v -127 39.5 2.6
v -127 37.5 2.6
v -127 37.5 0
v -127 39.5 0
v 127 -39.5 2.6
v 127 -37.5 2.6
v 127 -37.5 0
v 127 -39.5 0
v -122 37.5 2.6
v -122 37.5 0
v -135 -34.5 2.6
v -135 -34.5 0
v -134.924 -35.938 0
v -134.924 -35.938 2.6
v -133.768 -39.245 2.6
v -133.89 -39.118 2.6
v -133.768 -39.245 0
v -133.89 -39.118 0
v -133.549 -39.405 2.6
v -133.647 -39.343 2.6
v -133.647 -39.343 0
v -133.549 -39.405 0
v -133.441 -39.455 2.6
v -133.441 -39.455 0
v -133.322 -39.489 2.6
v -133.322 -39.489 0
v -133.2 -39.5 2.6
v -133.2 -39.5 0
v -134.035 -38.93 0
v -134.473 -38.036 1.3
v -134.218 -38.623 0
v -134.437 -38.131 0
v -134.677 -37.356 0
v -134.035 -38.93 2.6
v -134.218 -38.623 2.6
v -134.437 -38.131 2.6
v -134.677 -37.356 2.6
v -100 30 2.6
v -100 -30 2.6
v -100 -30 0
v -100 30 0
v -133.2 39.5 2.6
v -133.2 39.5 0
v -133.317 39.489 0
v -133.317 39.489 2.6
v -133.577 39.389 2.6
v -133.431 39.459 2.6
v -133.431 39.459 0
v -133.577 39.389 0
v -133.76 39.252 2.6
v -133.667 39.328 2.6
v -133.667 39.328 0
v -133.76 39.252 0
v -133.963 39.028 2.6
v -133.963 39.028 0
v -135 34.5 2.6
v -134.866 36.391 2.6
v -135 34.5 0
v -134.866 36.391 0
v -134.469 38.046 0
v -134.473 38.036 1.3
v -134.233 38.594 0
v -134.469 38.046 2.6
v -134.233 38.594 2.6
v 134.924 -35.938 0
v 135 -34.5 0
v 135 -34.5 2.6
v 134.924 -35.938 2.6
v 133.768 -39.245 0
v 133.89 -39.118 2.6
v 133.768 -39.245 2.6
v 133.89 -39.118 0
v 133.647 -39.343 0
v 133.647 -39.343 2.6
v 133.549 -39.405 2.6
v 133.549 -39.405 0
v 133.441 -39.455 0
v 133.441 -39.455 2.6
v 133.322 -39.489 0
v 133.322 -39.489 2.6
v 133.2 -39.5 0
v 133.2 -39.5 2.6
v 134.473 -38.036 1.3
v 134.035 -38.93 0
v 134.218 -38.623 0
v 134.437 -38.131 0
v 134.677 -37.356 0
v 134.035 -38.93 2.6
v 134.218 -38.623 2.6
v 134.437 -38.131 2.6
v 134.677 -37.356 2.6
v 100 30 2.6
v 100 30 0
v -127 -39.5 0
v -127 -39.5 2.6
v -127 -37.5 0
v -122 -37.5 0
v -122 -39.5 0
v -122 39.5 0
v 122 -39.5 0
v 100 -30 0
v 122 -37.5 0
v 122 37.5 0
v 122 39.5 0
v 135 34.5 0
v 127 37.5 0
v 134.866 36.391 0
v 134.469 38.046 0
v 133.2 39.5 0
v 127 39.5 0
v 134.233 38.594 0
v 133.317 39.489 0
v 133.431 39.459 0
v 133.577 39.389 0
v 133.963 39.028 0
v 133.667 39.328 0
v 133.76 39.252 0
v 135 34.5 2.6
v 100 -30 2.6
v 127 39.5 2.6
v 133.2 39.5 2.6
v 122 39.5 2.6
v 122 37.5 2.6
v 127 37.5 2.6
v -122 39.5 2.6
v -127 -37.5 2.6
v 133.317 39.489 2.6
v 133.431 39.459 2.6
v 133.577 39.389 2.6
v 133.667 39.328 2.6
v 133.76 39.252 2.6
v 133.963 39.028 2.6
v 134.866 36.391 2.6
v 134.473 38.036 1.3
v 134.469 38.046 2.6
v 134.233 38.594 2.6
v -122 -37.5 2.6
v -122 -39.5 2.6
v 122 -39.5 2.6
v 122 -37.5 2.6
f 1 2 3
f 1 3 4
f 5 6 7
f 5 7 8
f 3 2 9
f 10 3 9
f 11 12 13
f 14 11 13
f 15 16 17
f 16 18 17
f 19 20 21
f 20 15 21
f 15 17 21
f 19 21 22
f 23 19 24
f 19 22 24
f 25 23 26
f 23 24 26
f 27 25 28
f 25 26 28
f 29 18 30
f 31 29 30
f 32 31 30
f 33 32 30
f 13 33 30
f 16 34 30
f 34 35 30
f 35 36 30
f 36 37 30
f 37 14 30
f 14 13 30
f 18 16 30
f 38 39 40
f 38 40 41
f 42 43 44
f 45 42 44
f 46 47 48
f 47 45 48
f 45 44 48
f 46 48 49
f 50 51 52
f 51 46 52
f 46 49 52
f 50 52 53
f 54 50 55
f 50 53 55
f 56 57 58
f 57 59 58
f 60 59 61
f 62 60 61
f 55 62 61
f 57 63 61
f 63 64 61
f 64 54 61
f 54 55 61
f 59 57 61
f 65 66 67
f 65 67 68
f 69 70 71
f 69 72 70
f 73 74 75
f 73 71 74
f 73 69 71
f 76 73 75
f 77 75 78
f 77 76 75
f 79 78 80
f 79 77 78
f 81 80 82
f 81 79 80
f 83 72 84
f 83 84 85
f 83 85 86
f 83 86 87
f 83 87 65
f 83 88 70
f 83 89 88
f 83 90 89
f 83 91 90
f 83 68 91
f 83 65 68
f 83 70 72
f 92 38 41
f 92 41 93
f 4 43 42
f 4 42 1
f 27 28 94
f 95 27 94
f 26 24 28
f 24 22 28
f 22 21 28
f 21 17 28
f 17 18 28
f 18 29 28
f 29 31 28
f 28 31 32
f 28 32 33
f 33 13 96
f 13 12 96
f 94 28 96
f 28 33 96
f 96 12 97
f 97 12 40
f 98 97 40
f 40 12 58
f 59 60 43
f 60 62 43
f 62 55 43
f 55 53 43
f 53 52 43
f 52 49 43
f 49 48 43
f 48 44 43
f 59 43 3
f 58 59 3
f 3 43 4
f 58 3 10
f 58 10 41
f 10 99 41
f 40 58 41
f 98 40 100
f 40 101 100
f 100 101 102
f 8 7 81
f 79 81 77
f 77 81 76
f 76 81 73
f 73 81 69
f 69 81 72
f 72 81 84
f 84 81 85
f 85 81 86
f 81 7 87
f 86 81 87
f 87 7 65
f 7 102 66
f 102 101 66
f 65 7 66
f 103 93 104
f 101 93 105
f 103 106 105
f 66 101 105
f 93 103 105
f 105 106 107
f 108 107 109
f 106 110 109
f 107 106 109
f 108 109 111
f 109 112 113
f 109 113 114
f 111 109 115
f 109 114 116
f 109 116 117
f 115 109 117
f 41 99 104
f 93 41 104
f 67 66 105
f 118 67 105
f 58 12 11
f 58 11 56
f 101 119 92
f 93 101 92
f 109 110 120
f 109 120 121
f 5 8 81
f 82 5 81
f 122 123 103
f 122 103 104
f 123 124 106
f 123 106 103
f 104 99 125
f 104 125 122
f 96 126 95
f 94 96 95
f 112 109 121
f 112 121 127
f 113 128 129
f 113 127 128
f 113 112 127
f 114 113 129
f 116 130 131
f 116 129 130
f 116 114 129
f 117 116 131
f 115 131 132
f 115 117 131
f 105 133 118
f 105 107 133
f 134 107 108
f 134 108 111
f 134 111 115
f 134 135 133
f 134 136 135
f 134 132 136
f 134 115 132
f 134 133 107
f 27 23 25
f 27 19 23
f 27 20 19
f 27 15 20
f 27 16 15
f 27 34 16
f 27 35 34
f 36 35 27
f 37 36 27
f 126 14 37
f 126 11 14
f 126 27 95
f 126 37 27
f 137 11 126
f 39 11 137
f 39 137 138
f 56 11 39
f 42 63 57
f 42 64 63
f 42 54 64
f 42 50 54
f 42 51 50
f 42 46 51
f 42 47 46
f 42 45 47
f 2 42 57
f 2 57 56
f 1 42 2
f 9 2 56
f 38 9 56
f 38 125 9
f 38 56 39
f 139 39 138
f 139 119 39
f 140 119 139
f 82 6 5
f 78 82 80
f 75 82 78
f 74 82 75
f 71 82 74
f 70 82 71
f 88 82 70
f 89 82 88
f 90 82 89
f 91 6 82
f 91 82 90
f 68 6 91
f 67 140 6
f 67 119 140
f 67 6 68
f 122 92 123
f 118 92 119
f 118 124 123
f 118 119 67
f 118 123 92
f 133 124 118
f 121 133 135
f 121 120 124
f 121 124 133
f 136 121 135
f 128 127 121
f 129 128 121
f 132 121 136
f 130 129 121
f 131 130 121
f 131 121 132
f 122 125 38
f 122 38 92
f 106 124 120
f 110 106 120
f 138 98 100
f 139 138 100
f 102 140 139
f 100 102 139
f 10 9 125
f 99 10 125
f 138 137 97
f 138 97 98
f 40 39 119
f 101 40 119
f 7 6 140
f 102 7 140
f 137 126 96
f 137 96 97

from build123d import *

# Parameters (mm, degrees)
SKETCH_1_W               = 270
SKETCH_1_H               = 79
EXTRUDE_1_DEPTH          = 2.6
SKETCH_2_W               = 200
SKETCH_2_H               = 60
CUT_EXTRUDE_1_DEPTH      = 141.684078701
FILLET_1_SIZE            = 5
FILLET_1_SIZE_2          = 1.8
SKETCH_3_W               = 5
SKETCH_3_H               = 2
CUT_EXTRUDE_2_DEPTH      = 141.684078827
MIRROR_2_COPY_1_SKETCH_W = 5
MIRROR_2_COPY_1_SKETCH_H = 2
MIRROR_2_COPY_1_DEPTH    = 141.684078827


with BuildPart() as part:
    # 草图1 → 凸台-拉伸1 (new body)
    with BuildSketch(Plane.XY):
        Rectangle(SKETCH_1_W, SKETCH_1_H)
    extrude(amount=EXTRUDE_1_DEPTH)

    # 草图2 → 切除-拉伸1 (cut, through all)
    with BuildSketch(Plane.XY.offset(2.6)):
        Rectangle(SKETCH_2_W, SKETCH_2_H)
    extrude(amount=-CUT_EXTRUDE_1_DEPTH, mode=Mode.SUBTRACT)

    # 圆角1
    # an asymmetric fillet: 5, 1.8 mm, written as the material it takes off along each edge
    with BuildSketch(Plane(origin=(135, -39.5, -12.5), x_dir=(0, 1, 0), z_dir=(0, 0, 1))) as fillet_1_piece_1:
        with BuildLine():
            Bezier((FILLET_1_SIZE, 0), (0, 0), (0, FILLET_1_SIZE_2), weights=[1, 0.707106781, 1])
            Line((0, FILLET_1_SIZE_2), (0, 0))
            Line((0, 0), (FILLET_1_SIZE, 0))
        make_face()
    extrude(amount=27.6, mode=Mode.SUBTRACT)
    with BuildSketch(Plane(origin=(135, 39.5, -12.5), x_dir=(-1, 0, 0), z_dir=(0, 0, 1))) as fillet_1_piece_2:
        with BuildLine():
            Bezier((FILLET_1_SIZE_2, 0), (0, 0), (0, FILLET_1_SIZE), weights=[1, 0.707106781, 1])
            Line((0, FILLET_1_SIZE), (0, 0))
            Line((0, 0), (FILLET_1_SIZE_2, 0))
        make_face()
    extrude(amount=27.6, mode=Mode.SUBTRACT)
    with BuildSketch(Plane(origin=(-135, -39.5, -12.5), x_dir=(0, 1, 0), z_dir=(0, 0, 1))) as fillet_1_piece_3:
        with BuildLine():
            Bezier((FILLET_1_SIZE, 0), (0, 0), (0, -FILLET_1_SIZE_2), weights=[1, 0.707106781, 1])
            Line((0, -FILLET_1_SIZE_2), (0, 0))
            Line((0, 0), (FILLET_1_SIZE, 0))
        make_face()
    extrude(amount=27.6, mode=Mode.SUBTRACT)
    with BuildSketch(Plane(origin=(-135, 39.5, -12.5), x_dir=(1, 0, 0), z_dir=(0, 0, 1))) as fillet_1_piece_4:
        with BuildLine():
            Bezier((FILLET_1_SIZE_2, 0), (0, 0), (0, -FILLET_1_SIZE), weights=[1, 0.707106781, 1])
            Line((0, -FILLET_1_SIZE), (0, 0))
            Line((0, 0), (FILLET_1_SIZE_2, 0))
        make_face()
    extrude(amount=27.6, mode=Mode.SUBTRACT)

    # 草图3 → 切除-拉伸2 (cut, through all)
    with BuildSketch(Plane.XY.offset(2.6)):
        with Locations((-124.5, 38.5)):
            Rectangle(SKETCH_3_W, SKETCH_3_H)
    cut_extrude_2 = extrude(amount=-CUT_EXTRUDE_2_DEPTH, mode=Mode.SUBTRACT)

    # 镜向1: 切除-拉伸2 across plane
    add(cut_extrude_2.mirror(Plane.ZX), mode=Mode.SUBTRACT)

    # 镜向2: 切除-拉伸2 across plane
    add(cut_extrude_2.mirror(Plane(origin=(0, 0, 0), x_dir=(0, 0, 1), z_dir=(1, 0, 0))), mode=Mode.SUBTRACT)

    # 镜向2 copy 1 sketch → 镜向2 copy 1 (cut, through all)
    with BuildSketch(Plane(origin=(0, 0, 2.6), x_dir=(-1, 0, 0), z_dir=(0, 0, 1))):
        with Locations((-124.5, 38.5)):
            Rectangle(MIRROR_2_COPY_1_SKETCH_W, MIRROR_2_COPY_1_SKETCH_H)
    extrude(amount=-MIRROR_2_COPY_1_DEPTH, mode=Mode.SUBTRACT)


solid = part.part
